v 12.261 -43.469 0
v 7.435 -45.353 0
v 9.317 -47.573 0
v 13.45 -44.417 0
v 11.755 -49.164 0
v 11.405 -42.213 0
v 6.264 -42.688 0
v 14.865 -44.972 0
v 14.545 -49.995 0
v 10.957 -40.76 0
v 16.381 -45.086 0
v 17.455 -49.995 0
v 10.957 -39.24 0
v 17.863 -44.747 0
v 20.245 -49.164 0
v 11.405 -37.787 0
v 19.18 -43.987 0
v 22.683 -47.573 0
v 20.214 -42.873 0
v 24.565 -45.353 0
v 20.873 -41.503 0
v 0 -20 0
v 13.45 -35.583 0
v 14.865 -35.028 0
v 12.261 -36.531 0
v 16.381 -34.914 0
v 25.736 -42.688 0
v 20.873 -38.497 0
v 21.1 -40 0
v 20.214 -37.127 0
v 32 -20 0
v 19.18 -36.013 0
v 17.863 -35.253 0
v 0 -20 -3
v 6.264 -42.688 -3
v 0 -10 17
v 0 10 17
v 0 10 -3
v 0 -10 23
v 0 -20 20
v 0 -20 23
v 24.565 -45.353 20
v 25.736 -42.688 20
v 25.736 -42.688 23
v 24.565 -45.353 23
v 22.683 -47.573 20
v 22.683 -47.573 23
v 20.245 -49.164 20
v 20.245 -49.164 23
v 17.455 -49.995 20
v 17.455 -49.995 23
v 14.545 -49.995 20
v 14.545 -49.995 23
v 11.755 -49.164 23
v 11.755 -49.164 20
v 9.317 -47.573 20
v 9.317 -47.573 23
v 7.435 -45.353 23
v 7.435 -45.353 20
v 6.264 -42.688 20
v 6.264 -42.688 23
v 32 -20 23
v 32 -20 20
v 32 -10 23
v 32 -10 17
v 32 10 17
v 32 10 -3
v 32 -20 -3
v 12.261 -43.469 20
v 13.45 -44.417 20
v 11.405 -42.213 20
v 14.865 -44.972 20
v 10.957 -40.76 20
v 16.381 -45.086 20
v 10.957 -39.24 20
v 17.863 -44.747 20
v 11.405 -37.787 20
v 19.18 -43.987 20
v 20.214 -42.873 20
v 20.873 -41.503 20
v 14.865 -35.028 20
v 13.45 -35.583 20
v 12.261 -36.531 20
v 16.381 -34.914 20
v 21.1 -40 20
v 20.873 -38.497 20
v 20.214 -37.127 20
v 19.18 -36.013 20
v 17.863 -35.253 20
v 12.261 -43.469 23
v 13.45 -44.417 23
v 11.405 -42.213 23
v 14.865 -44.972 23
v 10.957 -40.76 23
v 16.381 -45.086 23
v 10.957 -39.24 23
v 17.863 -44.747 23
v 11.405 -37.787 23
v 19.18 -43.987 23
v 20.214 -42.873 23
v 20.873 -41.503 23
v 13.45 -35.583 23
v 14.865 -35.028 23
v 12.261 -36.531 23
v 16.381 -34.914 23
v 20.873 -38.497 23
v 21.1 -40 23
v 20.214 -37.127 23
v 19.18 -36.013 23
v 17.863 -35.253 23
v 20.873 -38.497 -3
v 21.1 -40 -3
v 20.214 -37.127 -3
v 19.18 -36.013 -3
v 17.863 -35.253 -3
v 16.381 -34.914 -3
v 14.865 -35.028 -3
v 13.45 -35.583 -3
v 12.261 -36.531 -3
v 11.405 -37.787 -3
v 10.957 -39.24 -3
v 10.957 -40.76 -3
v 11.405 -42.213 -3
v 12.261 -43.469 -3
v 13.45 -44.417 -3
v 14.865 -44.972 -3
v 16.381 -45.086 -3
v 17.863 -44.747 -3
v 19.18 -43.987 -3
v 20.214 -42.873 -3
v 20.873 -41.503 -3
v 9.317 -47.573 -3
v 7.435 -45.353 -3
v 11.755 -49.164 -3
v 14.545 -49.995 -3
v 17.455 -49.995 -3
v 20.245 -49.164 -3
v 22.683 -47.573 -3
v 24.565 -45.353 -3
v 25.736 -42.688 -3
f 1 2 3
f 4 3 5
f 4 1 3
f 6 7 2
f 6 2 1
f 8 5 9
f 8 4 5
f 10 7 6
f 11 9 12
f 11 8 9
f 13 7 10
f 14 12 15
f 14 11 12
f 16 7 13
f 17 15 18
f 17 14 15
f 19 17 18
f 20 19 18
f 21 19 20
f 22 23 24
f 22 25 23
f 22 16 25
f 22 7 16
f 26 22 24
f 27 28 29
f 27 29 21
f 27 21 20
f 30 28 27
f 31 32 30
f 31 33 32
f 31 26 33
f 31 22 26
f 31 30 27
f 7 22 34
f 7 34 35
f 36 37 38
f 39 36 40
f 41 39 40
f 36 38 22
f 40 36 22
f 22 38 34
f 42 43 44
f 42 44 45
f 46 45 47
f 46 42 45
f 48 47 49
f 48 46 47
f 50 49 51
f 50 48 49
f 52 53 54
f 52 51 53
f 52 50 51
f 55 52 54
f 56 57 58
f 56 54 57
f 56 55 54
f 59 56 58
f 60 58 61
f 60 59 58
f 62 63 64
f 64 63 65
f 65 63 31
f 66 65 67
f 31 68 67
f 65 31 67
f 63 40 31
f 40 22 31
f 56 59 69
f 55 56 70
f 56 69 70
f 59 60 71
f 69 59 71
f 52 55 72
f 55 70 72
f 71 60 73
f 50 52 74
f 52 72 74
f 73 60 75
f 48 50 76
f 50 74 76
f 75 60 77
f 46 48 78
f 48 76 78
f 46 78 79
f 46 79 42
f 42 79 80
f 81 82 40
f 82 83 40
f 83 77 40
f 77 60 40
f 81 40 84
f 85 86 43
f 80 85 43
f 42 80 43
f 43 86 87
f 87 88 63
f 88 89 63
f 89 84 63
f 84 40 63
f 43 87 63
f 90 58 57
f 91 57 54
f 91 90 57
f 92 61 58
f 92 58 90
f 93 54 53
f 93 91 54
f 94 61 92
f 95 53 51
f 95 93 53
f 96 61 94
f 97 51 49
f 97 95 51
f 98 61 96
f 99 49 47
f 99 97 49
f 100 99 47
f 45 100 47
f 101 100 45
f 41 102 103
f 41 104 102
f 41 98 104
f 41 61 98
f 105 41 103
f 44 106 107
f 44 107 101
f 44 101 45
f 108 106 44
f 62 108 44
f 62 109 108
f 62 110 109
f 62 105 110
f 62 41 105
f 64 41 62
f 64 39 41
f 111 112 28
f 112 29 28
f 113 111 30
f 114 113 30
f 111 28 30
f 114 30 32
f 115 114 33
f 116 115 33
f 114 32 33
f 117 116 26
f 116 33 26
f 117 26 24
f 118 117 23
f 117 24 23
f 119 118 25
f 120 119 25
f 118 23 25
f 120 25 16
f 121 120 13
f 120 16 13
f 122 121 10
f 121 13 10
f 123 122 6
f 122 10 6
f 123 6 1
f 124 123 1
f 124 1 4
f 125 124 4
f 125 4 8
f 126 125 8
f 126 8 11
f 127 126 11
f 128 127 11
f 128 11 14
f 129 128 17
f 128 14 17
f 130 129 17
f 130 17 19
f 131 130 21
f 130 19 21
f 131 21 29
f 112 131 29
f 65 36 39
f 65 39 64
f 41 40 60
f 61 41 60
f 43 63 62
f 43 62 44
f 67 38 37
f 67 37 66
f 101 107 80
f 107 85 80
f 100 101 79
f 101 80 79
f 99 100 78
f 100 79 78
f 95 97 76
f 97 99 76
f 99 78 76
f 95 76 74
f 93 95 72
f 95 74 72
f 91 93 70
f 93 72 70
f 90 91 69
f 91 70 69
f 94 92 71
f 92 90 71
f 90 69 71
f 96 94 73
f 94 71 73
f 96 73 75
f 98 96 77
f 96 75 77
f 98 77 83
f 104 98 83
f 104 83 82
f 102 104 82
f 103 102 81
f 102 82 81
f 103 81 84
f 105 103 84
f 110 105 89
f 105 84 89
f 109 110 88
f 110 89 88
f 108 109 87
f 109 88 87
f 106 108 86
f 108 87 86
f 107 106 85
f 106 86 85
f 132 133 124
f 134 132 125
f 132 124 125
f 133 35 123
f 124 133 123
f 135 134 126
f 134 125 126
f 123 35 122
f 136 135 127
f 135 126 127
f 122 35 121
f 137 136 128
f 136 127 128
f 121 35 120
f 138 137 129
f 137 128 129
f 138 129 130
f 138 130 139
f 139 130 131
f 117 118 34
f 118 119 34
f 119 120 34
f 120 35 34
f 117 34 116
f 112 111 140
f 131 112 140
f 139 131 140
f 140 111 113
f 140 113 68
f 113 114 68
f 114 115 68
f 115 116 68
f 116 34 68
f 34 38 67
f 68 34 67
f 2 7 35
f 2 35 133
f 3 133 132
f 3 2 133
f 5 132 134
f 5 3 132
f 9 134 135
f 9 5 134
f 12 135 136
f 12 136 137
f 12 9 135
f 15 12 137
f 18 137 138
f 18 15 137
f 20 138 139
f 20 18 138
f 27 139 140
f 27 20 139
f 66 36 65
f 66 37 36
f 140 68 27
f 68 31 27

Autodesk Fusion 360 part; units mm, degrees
sketch "Sketch1" plane through (0, 0, 0) normal (0, 0, 1) x (1, 0, 0)
  line L0 (0, 0) -> (32, 0)
  line L1 (0, 0) -> (0, -20)
  line L2 (0, -20) -> (32, -20)
  line L3 (32, -20) -> (32, 0)
  line L4 (16, -20) -> (16, -40) construction
  circle A0 centre (16, -40) radius 10.1
  line L5 (0, -20) -> (6.2643, -42.6881)
  line L6 (32, -20) -> (25.7357, -42.6881)
  circle A1 centre (16, -40) radius 5.1
  circle A2 centre (16, -40) radius 14 construction
  line L7 (0, -10) -> (32, -10)
  line L8 (0, 0) -> (0, 10)
  line L9 (0, 10) -> (32, 10)
  line L10 (32, 10) -> (32, 0)
  dimension "d1" = 32
  dimension "d2" = 20
  dimension "d5" = 20
  dimension "d6" = 20.2
  dimension "d7" = 10.2
  dimension "d8" = 28
  dimension "d14" = 10
extrude "Extrude1" add sketch "Sketch1" along normal blind 20 from surface at -3 contours L0 L8 L9 L10 | L0 L1 L3 L7 makes body 1
extrude "Extrude2" add sketch "Sketch1" against normal blind 3 contours L2 A0 L5 L6 | A0 bodies 1 makes body 2
extrude "Extrude3" add sketch "Sketch1" along normal blind 3 from surface at 20 contours L2 A0 L5 L6 | A0 bodies 2 makes body 3
extrude "Extrude4" add sketch "Sketch1" along normal blind 26 from surface at -3 contours L1 L2 L3 L7 bodies 1 2 3
sketch "Sketch2" plane through (0, 0, 17) normal (0, 0, 1) x (-1, 0, 0)
  line L0 (0, -10) -> (0, 10)
  line L1 (0, 10) -> (-32, 10)
  line L2 (-32, 10) -> (-32, -10)
  line L3 (-32, -10) -> (0, -10)
  line L4 (0, -10) -> (-16, -10) construction
  line L5 (-8, -10) -> (-8, 0) construction
  line L6 (-16, -10) -> (-24, -10) construction
  line L7 (-24, -10) -> (-24, 0) construction
  circle A0 centre (-24, 0) radius 1.6
  circle A1 centre (-8, 0) radius 1.6
  dimension "d19" = 8
  dimension "d20" = 10
  dimension "d21" = 3.2
  dimension "d22" = 3.2
extrude "Extrude5" cut sketch "Sketch2" along normal through all contours A0 | A1 bodies 1
equation "d9 = -( 20 / 2 ) * 2 mm + ( ( 14 + 1.5 * 2 ) / 2 ) * 2 mm"
equation "d12 = ( ( 20 / 2 ) * 2 mm - ( ( 14 + 1.5 * 2 ) / 2 ) * 2 mm )"
